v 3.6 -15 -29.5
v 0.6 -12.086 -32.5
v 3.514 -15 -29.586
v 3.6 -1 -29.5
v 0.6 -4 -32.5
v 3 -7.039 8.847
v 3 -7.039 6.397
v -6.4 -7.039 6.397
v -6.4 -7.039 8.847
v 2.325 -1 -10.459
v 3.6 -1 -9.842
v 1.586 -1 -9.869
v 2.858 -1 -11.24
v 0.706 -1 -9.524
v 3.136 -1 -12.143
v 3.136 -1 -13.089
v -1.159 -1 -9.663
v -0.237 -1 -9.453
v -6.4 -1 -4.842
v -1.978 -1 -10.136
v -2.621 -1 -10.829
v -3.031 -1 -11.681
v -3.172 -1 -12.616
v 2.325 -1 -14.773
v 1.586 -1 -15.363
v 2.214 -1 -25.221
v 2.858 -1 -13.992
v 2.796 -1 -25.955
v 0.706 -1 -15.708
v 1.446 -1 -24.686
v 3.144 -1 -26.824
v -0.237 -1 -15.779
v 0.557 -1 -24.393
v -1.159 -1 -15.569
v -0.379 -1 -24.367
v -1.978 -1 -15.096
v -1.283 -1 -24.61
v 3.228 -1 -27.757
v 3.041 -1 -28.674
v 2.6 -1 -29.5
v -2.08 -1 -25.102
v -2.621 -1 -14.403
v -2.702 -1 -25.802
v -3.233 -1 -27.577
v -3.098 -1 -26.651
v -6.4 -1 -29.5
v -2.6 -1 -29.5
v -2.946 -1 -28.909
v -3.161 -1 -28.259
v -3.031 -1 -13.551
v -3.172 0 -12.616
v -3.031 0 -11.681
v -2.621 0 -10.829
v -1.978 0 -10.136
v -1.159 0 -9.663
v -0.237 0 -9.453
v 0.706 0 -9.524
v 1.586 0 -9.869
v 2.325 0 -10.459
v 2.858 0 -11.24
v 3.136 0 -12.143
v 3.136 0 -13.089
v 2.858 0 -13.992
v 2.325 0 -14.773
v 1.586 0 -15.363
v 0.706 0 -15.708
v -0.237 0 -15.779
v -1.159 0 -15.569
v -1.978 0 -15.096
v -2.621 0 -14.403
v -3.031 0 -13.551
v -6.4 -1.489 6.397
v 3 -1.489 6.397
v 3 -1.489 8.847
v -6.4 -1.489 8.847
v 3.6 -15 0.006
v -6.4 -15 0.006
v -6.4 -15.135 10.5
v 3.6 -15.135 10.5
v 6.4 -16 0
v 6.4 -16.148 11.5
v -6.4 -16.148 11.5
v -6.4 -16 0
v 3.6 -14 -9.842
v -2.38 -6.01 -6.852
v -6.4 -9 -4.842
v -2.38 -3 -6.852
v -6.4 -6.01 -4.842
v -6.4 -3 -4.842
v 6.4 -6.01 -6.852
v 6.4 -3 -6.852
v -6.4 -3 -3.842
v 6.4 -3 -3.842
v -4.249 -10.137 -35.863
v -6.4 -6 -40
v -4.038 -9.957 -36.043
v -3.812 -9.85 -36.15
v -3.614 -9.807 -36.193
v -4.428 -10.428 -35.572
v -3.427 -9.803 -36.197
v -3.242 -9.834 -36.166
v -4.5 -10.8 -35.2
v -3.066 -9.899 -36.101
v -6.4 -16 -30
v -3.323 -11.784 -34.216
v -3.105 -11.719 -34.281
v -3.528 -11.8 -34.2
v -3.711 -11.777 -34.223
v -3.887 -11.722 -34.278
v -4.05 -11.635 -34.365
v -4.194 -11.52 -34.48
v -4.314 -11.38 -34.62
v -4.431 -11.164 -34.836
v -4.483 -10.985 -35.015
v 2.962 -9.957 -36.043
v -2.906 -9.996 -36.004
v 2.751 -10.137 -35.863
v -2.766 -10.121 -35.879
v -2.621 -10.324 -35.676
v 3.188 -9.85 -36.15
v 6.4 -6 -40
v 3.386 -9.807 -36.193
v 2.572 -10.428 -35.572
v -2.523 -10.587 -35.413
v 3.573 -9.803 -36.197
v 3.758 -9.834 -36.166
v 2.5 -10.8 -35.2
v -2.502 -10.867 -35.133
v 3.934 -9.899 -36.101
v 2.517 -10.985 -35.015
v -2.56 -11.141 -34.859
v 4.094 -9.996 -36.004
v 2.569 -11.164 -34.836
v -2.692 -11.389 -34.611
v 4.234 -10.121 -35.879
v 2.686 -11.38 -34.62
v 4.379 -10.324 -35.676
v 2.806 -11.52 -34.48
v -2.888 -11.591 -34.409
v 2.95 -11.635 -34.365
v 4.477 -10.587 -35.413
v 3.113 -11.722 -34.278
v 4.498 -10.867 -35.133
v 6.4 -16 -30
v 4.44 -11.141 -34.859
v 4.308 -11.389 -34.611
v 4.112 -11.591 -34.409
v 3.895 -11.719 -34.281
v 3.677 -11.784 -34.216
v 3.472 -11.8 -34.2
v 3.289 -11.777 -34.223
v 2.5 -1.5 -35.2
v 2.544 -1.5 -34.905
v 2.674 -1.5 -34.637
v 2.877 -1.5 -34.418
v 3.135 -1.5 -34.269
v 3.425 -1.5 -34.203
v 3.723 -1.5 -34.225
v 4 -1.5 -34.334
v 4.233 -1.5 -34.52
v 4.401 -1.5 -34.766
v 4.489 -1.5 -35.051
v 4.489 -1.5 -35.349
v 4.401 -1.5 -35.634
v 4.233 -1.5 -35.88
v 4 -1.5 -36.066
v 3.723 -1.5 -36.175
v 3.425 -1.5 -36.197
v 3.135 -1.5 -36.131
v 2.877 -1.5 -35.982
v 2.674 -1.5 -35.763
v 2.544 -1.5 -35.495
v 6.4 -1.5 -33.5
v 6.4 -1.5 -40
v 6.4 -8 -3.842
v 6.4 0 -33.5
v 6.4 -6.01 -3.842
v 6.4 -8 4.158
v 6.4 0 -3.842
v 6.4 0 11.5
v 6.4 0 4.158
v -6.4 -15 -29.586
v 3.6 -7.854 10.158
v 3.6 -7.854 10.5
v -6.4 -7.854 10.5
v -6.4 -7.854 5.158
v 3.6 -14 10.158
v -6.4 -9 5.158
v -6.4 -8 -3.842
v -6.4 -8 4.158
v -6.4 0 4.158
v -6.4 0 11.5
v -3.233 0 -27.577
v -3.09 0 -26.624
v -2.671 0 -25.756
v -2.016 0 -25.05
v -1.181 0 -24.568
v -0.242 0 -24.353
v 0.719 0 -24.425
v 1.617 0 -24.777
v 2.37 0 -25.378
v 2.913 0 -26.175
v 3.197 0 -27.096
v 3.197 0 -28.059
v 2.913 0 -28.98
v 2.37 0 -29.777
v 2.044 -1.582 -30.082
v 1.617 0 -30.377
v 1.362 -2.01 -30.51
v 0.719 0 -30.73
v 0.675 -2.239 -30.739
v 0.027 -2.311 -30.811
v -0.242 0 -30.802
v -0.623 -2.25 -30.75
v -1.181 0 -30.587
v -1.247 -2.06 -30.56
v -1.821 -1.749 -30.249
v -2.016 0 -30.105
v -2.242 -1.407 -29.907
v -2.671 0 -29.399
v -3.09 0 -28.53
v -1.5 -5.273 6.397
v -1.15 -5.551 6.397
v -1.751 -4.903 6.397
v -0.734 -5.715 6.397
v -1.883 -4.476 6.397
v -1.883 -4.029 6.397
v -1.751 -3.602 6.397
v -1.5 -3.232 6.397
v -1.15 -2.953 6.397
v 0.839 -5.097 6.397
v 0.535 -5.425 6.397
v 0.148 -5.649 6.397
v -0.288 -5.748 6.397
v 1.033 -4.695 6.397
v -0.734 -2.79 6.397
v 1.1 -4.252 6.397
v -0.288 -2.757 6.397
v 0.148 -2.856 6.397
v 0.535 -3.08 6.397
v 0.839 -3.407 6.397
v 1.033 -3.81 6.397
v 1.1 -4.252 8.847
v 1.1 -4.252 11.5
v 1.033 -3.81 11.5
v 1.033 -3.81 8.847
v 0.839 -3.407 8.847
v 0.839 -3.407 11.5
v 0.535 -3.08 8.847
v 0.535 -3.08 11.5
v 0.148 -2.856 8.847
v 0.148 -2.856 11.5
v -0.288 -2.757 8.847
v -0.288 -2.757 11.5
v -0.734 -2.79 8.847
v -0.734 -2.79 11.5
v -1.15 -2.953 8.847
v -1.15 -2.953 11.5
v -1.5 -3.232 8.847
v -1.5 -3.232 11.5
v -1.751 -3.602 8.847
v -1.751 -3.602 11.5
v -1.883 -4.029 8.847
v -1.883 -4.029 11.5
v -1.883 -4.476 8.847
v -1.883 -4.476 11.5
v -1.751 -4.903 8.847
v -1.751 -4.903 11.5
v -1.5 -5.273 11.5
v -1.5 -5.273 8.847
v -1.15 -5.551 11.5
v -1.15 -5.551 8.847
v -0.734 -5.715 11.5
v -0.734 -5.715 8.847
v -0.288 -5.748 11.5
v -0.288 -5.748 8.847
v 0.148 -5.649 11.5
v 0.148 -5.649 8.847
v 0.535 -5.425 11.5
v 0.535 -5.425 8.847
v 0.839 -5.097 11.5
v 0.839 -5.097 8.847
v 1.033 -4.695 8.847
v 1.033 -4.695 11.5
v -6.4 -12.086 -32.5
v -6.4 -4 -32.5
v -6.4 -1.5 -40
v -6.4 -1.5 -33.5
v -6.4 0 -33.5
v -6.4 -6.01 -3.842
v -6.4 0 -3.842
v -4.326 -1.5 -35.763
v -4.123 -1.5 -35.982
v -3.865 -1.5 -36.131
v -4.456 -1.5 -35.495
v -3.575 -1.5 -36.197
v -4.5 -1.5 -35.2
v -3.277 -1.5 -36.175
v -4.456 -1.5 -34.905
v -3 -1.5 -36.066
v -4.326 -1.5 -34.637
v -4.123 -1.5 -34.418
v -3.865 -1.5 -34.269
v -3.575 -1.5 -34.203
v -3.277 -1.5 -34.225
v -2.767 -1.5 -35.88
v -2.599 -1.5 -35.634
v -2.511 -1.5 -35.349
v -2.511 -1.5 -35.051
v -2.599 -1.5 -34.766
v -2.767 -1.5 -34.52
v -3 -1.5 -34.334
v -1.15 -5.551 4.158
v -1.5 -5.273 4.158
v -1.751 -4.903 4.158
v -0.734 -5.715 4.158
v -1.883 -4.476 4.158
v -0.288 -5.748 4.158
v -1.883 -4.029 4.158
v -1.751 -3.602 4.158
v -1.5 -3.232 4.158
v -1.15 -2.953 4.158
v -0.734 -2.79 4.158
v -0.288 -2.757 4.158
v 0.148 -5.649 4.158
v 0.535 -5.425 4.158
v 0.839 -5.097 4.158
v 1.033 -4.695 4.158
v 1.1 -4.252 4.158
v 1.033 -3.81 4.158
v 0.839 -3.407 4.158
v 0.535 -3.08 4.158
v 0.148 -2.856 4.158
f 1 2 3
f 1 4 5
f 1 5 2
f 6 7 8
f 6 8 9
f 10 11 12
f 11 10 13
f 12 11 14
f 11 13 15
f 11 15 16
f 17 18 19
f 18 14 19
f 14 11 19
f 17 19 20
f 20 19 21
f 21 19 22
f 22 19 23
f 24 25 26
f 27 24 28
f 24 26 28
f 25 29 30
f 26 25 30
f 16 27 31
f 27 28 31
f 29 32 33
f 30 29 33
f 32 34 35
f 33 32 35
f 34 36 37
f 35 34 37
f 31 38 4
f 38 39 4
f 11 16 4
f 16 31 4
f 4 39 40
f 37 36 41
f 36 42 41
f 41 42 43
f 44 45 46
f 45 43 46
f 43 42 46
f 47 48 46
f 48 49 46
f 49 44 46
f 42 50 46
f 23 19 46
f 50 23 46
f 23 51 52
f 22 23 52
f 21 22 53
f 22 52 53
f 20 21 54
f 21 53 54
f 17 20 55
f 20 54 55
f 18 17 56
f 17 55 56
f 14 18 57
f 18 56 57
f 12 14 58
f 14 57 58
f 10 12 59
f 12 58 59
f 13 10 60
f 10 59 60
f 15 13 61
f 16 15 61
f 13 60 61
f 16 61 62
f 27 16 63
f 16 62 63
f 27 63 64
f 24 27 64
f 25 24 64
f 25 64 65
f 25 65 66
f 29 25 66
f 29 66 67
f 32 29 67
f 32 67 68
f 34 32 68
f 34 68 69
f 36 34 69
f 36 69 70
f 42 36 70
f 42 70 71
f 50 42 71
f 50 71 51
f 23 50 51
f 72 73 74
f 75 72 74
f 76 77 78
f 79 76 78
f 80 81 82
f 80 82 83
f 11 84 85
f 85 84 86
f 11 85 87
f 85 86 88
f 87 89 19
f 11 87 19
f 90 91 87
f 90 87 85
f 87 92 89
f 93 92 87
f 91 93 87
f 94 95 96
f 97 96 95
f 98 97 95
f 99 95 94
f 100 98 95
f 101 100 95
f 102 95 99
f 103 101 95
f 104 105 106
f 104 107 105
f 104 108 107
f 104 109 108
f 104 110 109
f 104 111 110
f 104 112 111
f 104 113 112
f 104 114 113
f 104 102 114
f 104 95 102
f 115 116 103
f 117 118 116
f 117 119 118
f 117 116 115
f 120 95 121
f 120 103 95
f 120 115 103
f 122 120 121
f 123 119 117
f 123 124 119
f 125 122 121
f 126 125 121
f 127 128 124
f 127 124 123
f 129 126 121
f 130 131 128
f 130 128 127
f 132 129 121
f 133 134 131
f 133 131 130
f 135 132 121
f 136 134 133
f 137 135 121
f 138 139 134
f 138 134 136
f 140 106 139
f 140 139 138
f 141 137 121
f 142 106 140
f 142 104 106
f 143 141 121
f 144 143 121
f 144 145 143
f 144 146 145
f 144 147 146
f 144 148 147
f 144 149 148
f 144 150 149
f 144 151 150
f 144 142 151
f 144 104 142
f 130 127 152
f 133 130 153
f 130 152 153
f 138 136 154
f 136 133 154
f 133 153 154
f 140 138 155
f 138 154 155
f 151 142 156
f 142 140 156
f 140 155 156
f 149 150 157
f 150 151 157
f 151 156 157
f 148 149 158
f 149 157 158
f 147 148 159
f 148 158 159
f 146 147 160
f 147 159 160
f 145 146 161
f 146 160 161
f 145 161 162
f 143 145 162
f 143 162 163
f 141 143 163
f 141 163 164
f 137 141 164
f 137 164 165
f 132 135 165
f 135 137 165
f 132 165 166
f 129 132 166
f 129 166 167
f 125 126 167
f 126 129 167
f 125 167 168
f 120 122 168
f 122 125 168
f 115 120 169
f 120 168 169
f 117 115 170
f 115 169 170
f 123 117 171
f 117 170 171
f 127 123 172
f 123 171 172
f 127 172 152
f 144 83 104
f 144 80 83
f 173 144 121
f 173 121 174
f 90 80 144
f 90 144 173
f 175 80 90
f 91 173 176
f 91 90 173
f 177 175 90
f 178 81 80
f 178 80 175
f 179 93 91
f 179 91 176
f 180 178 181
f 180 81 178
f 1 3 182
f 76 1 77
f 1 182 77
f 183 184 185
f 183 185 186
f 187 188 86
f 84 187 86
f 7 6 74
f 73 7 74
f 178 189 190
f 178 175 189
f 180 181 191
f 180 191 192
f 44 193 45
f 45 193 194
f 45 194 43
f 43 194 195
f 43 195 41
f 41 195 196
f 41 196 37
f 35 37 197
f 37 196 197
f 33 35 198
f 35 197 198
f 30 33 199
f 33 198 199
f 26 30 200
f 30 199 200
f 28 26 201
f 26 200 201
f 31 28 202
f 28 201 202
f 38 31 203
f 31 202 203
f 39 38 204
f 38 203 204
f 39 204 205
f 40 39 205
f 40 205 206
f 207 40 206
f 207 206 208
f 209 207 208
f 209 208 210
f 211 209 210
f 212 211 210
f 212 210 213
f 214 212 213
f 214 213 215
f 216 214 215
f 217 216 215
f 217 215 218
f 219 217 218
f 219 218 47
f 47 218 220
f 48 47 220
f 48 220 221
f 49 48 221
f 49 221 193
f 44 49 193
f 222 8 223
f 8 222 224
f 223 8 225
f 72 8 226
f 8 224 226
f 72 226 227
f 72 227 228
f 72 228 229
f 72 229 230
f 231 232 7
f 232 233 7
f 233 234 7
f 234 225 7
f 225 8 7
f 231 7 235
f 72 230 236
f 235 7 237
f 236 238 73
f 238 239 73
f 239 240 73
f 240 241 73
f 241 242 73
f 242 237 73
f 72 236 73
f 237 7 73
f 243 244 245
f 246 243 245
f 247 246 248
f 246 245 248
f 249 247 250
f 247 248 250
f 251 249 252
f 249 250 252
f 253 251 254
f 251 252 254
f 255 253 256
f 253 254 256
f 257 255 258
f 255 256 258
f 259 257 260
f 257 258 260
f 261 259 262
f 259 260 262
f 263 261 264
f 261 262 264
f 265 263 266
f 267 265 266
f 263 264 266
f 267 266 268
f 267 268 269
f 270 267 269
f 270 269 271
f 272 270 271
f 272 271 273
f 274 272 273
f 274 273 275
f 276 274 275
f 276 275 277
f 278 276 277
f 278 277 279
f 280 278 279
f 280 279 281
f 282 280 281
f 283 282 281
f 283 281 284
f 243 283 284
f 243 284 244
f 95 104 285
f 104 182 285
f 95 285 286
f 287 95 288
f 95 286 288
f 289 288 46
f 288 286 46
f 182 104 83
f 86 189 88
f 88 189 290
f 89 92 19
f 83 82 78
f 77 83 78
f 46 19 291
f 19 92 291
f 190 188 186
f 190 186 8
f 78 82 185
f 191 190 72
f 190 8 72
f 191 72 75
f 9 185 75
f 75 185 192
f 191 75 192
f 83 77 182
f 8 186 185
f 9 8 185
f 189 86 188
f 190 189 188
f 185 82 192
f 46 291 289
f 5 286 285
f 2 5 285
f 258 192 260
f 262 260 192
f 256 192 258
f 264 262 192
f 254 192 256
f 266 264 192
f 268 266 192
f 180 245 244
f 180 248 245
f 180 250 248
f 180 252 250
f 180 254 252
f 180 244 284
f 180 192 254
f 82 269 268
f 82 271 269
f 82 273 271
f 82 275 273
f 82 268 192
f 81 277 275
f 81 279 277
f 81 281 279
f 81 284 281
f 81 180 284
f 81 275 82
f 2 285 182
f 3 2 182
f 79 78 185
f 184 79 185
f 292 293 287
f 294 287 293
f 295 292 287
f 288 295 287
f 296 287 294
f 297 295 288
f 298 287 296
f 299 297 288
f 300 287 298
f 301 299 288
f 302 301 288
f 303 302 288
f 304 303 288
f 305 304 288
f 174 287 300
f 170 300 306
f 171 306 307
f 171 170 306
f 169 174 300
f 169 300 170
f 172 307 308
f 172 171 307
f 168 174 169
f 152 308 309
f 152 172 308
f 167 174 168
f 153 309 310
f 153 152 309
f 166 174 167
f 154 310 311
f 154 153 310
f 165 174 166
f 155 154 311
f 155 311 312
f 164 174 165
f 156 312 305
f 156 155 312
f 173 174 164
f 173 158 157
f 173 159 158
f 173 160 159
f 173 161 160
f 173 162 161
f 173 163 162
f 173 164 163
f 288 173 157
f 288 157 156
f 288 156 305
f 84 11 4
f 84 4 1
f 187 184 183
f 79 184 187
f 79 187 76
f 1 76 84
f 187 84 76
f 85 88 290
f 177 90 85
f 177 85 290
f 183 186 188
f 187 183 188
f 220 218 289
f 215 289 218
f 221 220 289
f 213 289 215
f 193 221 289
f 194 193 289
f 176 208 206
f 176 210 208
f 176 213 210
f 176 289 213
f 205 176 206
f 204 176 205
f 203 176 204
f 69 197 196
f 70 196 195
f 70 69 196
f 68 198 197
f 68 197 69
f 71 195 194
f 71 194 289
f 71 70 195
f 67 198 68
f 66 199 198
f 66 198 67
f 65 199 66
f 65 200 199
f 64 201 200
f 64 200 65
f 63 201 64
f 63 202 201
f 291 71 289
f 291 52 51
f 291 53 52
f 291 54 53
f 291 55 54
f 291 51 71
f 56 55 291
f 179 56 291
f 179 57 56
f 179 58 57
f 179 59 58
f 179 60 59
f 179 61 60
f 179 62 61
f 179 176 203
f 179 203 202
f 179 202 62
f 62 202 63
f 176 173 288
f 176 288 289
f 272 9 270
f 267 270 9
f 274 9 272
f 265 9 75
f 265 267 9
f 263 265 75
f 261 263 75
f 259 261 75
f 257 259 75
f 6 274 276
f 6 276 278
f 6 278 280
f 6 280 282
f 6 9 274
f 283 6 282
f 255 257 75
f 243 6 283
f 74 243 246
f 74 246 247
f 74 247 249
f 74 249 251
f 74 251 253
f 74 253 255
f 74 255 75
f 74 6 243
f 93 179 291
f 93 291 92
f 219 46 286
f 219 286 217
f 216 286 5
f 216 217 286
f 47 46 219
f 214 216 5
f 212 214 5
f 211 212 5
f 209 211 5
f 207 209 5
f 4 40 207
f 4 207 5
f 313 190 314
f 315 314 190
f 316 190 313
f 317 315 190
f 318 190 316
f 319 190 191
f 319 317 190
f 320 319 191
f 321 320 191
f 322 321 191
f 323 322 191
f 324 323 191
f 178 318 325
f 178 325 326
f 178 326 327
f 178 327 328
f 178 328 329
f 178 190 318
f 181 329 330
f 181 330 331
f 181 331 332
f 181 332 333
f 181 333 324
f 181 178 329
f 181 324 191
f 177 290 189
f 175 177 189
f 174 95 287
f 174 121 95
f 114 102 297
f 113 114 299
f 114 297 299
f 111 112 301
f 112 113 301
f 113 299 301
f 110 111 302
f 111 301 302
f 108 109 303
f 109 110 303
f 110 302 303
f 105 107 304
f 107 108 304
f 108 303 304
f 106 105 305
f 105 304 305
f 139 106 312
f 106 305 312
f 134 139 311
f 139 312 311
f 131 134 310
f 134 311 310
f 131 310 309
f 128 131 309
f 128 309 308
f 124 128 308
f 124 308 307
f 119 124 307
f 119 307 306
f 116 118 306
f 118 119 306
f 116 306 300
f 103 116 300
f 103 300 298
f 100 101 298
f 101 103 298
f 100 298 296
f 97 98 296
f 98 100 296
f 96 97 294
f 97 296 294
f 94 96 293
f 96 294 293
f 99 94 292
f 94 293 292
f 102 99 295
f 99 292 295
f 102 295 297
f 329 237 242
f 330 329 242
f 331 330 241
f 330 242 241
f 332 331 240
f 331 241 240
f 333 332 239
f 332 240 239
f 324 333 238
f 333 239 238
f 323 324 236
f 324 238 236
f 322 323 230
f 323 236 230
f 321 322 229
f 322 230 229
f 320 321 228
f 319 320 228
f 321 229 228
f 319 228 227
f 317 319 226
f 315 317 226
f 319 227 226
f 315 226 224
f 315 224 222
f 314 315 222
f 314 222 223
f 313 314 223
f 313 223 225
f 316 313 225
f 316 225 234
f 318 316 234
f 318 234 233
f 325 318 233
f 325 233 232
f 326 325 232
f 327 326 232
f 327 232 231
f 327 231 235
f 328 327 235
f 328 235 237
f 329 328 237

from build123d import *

# Parameters (mm, degrees)
F0_W      = 5.55
F0_H      = 2.45
F1_DEPTH  = 6.4
F3_DEPTH  = 9.3
F2_R      = 1.5
F4_DEPTH  = 11.8
F5_DEPTH  = 3
F6_SIZE   = 10
F9_DEPTH  = 10
F10_R     = 1
F11_DEPTH = 16.7
F13_SIZE  = 3
F12_R     = 3.1718540483
F12_R_2   = 3.2332055741
F14_DEPTH = 11.3
F15_SIZE2 = 9.99999
F15_SIZE  = 4.99999


# Not quite as in the source:
# - a fillet or chamfer is up to 0.001 mm smaller than in the source, because OpenCascade refuses the exact size
# - a feature names something its author has since deleted; it is built from what else it names


with BuildPart() as f1:
    # F0 (on Right) → F1 (new body, symmetric)
    with BuildSketch(Plane.YZ):
        Polygon((-8, -3.8421934836), (-8, 0), (-16, 0), (-16, -40), (-1.5, -40), (-1.5, -33.5), (0, -33.5), (0, -3.8421934836), (-3, -3.8421934836), (-3, -6.8521934836), (-6.01, -6.8521934836), (-6.01, -3.8421934836), align=None)
        Polygon((-8, 4.1578065164), (0, 4.1578065164), (0, 8.6438981816), (0, 11.5000782534), (-16.1481745615, 11.5000782534), (-16, 0), (-8, 0), align=None)
        with Locations((-4.2636177904, 7.6219322528)):
            Rectangle(F0_W, F0_H, mode=Mode.SUBTRACT)
        with Locations((-4.2636177904, 7.6219322528)):
            Rectangle(F0_W, F0_H)
    extrude(amount=F1_DEPTH, both=True)

    # F0 (on Right) → F3 (cut)
    with BuildSketch(Plane.YZ):
        with Locations((-4.2636177904, 7.6219322528)):
            Rectangle(F0_W, F0_H)
    extrude(amount=-F3_DEPTH, mode=Mode.SUBTRACT)

    # F2 (on face) → F4 (cut)
    with BuildSketch(Plane.XY.offset(11.5000782534)):
        with Locations((-0.4, -4.2524)):
            Circle(F2_R)
    extrude(amount=-F4_DEPTH, mode=Mode.SUBTRACT)

    # F0 (on Right) → F5 (cut)
    with BuildSketch(Plane.YZ):
        with Locations((-4.2636177904, 7.6219322528)):
            Rectangle(F0_W, F0_H)
    extrude(amount=F5_DEPTH, mode=Mode.SUBTRACT)

    # F6
    f6_edges = [f1.edges().sort_by_distance(p)[0] for p in [
        (0, -16, -40),
    ]]
    chamfer(f6_edges, length=F6_SIZE)

    # F7 (on face) → F9 (cut)
    with BuildSketch(Plane(origin=(-6.4, 0, 0), x_dir=(0, -1, 0), z_dir=(-1, 0, 0))):
        Polygon((3, -6.8521934836), (3, -4.8421934836), (1, -4.8421934836), (1, -14.3586024642), (1, -21.1353842169), (1, -32.5), (2.5, -32.5), (12.0857864376, -32.5), (15, -29.5857864376), (15, 0.006442061), (15.135206901, 10.5000782534), (7.8539028764, 10.5000782534), (7.8539028764, 5.1578065164), (9, 5.1578065164), (9, -4.8421934836), (6.01, -4.8421934836), (6.01, -6.8521934836), align=None)
    extrude(amount=-F9_DEPTH, mode=Mode.SUBTRACT)

    # F10 (on face) → F11 (cut)
    with BuildSketch(Plane(origin=(0, -1.5, 0), x_dir=(-1, 0, 0), z_dir=(0, 1, 0))):
        with Locations((-3.5, -35.2)):
            Circle(F10_R)
        with Locations((3.5, -35.2)):
            Circle(F10_R)
    extrude(amount=-F11_DEPTH, mode=Mode.SUBTRACT)

    # F13
    f13_edges = [f1.edges().sort_by_distance(p)[0] for p in [
        (3.6, -6.542893, -32.5),
        (-1.4, -1, -32.5),
    ]]
    chamfer(f13_edges, length=F13_SIZE)

    # F12 (on face) → F14 (cut)
    with BuildSketch(Plane(origin=(0, 0, 0), x_dir=(-1, 0, 0), z_dir=(0, 1, 0))):
        with Locations((0, -12.6159423962)):
            Circle(F12_R)
        with Locations((0, -27.5774579495)):
            Circle(F12_R_2)
    extrude(amount=-F14_DEPTH, mode=Mode.SUBTRACT)

    # F15 (size 5 and 10 in the source; OpenCascade refuses exactly that, so slightly less here)
    f15_edges = [f1.edges().sort_by_distance(p)[0] for p in [
        (3.6, -7.505, -4.842193),
        (3.6, -9, 0.157807),
        (3.6, -8.426951, 5.157807),
    ]]
    f15_side = f1.faces().sort_by_distance((3.6, -8.906235, -12.735974))[0]
    chamfer(f15_edges, length=F15_SIZE, length2=F15_SIZE2, reference=f15_side)


solid = f1.part
